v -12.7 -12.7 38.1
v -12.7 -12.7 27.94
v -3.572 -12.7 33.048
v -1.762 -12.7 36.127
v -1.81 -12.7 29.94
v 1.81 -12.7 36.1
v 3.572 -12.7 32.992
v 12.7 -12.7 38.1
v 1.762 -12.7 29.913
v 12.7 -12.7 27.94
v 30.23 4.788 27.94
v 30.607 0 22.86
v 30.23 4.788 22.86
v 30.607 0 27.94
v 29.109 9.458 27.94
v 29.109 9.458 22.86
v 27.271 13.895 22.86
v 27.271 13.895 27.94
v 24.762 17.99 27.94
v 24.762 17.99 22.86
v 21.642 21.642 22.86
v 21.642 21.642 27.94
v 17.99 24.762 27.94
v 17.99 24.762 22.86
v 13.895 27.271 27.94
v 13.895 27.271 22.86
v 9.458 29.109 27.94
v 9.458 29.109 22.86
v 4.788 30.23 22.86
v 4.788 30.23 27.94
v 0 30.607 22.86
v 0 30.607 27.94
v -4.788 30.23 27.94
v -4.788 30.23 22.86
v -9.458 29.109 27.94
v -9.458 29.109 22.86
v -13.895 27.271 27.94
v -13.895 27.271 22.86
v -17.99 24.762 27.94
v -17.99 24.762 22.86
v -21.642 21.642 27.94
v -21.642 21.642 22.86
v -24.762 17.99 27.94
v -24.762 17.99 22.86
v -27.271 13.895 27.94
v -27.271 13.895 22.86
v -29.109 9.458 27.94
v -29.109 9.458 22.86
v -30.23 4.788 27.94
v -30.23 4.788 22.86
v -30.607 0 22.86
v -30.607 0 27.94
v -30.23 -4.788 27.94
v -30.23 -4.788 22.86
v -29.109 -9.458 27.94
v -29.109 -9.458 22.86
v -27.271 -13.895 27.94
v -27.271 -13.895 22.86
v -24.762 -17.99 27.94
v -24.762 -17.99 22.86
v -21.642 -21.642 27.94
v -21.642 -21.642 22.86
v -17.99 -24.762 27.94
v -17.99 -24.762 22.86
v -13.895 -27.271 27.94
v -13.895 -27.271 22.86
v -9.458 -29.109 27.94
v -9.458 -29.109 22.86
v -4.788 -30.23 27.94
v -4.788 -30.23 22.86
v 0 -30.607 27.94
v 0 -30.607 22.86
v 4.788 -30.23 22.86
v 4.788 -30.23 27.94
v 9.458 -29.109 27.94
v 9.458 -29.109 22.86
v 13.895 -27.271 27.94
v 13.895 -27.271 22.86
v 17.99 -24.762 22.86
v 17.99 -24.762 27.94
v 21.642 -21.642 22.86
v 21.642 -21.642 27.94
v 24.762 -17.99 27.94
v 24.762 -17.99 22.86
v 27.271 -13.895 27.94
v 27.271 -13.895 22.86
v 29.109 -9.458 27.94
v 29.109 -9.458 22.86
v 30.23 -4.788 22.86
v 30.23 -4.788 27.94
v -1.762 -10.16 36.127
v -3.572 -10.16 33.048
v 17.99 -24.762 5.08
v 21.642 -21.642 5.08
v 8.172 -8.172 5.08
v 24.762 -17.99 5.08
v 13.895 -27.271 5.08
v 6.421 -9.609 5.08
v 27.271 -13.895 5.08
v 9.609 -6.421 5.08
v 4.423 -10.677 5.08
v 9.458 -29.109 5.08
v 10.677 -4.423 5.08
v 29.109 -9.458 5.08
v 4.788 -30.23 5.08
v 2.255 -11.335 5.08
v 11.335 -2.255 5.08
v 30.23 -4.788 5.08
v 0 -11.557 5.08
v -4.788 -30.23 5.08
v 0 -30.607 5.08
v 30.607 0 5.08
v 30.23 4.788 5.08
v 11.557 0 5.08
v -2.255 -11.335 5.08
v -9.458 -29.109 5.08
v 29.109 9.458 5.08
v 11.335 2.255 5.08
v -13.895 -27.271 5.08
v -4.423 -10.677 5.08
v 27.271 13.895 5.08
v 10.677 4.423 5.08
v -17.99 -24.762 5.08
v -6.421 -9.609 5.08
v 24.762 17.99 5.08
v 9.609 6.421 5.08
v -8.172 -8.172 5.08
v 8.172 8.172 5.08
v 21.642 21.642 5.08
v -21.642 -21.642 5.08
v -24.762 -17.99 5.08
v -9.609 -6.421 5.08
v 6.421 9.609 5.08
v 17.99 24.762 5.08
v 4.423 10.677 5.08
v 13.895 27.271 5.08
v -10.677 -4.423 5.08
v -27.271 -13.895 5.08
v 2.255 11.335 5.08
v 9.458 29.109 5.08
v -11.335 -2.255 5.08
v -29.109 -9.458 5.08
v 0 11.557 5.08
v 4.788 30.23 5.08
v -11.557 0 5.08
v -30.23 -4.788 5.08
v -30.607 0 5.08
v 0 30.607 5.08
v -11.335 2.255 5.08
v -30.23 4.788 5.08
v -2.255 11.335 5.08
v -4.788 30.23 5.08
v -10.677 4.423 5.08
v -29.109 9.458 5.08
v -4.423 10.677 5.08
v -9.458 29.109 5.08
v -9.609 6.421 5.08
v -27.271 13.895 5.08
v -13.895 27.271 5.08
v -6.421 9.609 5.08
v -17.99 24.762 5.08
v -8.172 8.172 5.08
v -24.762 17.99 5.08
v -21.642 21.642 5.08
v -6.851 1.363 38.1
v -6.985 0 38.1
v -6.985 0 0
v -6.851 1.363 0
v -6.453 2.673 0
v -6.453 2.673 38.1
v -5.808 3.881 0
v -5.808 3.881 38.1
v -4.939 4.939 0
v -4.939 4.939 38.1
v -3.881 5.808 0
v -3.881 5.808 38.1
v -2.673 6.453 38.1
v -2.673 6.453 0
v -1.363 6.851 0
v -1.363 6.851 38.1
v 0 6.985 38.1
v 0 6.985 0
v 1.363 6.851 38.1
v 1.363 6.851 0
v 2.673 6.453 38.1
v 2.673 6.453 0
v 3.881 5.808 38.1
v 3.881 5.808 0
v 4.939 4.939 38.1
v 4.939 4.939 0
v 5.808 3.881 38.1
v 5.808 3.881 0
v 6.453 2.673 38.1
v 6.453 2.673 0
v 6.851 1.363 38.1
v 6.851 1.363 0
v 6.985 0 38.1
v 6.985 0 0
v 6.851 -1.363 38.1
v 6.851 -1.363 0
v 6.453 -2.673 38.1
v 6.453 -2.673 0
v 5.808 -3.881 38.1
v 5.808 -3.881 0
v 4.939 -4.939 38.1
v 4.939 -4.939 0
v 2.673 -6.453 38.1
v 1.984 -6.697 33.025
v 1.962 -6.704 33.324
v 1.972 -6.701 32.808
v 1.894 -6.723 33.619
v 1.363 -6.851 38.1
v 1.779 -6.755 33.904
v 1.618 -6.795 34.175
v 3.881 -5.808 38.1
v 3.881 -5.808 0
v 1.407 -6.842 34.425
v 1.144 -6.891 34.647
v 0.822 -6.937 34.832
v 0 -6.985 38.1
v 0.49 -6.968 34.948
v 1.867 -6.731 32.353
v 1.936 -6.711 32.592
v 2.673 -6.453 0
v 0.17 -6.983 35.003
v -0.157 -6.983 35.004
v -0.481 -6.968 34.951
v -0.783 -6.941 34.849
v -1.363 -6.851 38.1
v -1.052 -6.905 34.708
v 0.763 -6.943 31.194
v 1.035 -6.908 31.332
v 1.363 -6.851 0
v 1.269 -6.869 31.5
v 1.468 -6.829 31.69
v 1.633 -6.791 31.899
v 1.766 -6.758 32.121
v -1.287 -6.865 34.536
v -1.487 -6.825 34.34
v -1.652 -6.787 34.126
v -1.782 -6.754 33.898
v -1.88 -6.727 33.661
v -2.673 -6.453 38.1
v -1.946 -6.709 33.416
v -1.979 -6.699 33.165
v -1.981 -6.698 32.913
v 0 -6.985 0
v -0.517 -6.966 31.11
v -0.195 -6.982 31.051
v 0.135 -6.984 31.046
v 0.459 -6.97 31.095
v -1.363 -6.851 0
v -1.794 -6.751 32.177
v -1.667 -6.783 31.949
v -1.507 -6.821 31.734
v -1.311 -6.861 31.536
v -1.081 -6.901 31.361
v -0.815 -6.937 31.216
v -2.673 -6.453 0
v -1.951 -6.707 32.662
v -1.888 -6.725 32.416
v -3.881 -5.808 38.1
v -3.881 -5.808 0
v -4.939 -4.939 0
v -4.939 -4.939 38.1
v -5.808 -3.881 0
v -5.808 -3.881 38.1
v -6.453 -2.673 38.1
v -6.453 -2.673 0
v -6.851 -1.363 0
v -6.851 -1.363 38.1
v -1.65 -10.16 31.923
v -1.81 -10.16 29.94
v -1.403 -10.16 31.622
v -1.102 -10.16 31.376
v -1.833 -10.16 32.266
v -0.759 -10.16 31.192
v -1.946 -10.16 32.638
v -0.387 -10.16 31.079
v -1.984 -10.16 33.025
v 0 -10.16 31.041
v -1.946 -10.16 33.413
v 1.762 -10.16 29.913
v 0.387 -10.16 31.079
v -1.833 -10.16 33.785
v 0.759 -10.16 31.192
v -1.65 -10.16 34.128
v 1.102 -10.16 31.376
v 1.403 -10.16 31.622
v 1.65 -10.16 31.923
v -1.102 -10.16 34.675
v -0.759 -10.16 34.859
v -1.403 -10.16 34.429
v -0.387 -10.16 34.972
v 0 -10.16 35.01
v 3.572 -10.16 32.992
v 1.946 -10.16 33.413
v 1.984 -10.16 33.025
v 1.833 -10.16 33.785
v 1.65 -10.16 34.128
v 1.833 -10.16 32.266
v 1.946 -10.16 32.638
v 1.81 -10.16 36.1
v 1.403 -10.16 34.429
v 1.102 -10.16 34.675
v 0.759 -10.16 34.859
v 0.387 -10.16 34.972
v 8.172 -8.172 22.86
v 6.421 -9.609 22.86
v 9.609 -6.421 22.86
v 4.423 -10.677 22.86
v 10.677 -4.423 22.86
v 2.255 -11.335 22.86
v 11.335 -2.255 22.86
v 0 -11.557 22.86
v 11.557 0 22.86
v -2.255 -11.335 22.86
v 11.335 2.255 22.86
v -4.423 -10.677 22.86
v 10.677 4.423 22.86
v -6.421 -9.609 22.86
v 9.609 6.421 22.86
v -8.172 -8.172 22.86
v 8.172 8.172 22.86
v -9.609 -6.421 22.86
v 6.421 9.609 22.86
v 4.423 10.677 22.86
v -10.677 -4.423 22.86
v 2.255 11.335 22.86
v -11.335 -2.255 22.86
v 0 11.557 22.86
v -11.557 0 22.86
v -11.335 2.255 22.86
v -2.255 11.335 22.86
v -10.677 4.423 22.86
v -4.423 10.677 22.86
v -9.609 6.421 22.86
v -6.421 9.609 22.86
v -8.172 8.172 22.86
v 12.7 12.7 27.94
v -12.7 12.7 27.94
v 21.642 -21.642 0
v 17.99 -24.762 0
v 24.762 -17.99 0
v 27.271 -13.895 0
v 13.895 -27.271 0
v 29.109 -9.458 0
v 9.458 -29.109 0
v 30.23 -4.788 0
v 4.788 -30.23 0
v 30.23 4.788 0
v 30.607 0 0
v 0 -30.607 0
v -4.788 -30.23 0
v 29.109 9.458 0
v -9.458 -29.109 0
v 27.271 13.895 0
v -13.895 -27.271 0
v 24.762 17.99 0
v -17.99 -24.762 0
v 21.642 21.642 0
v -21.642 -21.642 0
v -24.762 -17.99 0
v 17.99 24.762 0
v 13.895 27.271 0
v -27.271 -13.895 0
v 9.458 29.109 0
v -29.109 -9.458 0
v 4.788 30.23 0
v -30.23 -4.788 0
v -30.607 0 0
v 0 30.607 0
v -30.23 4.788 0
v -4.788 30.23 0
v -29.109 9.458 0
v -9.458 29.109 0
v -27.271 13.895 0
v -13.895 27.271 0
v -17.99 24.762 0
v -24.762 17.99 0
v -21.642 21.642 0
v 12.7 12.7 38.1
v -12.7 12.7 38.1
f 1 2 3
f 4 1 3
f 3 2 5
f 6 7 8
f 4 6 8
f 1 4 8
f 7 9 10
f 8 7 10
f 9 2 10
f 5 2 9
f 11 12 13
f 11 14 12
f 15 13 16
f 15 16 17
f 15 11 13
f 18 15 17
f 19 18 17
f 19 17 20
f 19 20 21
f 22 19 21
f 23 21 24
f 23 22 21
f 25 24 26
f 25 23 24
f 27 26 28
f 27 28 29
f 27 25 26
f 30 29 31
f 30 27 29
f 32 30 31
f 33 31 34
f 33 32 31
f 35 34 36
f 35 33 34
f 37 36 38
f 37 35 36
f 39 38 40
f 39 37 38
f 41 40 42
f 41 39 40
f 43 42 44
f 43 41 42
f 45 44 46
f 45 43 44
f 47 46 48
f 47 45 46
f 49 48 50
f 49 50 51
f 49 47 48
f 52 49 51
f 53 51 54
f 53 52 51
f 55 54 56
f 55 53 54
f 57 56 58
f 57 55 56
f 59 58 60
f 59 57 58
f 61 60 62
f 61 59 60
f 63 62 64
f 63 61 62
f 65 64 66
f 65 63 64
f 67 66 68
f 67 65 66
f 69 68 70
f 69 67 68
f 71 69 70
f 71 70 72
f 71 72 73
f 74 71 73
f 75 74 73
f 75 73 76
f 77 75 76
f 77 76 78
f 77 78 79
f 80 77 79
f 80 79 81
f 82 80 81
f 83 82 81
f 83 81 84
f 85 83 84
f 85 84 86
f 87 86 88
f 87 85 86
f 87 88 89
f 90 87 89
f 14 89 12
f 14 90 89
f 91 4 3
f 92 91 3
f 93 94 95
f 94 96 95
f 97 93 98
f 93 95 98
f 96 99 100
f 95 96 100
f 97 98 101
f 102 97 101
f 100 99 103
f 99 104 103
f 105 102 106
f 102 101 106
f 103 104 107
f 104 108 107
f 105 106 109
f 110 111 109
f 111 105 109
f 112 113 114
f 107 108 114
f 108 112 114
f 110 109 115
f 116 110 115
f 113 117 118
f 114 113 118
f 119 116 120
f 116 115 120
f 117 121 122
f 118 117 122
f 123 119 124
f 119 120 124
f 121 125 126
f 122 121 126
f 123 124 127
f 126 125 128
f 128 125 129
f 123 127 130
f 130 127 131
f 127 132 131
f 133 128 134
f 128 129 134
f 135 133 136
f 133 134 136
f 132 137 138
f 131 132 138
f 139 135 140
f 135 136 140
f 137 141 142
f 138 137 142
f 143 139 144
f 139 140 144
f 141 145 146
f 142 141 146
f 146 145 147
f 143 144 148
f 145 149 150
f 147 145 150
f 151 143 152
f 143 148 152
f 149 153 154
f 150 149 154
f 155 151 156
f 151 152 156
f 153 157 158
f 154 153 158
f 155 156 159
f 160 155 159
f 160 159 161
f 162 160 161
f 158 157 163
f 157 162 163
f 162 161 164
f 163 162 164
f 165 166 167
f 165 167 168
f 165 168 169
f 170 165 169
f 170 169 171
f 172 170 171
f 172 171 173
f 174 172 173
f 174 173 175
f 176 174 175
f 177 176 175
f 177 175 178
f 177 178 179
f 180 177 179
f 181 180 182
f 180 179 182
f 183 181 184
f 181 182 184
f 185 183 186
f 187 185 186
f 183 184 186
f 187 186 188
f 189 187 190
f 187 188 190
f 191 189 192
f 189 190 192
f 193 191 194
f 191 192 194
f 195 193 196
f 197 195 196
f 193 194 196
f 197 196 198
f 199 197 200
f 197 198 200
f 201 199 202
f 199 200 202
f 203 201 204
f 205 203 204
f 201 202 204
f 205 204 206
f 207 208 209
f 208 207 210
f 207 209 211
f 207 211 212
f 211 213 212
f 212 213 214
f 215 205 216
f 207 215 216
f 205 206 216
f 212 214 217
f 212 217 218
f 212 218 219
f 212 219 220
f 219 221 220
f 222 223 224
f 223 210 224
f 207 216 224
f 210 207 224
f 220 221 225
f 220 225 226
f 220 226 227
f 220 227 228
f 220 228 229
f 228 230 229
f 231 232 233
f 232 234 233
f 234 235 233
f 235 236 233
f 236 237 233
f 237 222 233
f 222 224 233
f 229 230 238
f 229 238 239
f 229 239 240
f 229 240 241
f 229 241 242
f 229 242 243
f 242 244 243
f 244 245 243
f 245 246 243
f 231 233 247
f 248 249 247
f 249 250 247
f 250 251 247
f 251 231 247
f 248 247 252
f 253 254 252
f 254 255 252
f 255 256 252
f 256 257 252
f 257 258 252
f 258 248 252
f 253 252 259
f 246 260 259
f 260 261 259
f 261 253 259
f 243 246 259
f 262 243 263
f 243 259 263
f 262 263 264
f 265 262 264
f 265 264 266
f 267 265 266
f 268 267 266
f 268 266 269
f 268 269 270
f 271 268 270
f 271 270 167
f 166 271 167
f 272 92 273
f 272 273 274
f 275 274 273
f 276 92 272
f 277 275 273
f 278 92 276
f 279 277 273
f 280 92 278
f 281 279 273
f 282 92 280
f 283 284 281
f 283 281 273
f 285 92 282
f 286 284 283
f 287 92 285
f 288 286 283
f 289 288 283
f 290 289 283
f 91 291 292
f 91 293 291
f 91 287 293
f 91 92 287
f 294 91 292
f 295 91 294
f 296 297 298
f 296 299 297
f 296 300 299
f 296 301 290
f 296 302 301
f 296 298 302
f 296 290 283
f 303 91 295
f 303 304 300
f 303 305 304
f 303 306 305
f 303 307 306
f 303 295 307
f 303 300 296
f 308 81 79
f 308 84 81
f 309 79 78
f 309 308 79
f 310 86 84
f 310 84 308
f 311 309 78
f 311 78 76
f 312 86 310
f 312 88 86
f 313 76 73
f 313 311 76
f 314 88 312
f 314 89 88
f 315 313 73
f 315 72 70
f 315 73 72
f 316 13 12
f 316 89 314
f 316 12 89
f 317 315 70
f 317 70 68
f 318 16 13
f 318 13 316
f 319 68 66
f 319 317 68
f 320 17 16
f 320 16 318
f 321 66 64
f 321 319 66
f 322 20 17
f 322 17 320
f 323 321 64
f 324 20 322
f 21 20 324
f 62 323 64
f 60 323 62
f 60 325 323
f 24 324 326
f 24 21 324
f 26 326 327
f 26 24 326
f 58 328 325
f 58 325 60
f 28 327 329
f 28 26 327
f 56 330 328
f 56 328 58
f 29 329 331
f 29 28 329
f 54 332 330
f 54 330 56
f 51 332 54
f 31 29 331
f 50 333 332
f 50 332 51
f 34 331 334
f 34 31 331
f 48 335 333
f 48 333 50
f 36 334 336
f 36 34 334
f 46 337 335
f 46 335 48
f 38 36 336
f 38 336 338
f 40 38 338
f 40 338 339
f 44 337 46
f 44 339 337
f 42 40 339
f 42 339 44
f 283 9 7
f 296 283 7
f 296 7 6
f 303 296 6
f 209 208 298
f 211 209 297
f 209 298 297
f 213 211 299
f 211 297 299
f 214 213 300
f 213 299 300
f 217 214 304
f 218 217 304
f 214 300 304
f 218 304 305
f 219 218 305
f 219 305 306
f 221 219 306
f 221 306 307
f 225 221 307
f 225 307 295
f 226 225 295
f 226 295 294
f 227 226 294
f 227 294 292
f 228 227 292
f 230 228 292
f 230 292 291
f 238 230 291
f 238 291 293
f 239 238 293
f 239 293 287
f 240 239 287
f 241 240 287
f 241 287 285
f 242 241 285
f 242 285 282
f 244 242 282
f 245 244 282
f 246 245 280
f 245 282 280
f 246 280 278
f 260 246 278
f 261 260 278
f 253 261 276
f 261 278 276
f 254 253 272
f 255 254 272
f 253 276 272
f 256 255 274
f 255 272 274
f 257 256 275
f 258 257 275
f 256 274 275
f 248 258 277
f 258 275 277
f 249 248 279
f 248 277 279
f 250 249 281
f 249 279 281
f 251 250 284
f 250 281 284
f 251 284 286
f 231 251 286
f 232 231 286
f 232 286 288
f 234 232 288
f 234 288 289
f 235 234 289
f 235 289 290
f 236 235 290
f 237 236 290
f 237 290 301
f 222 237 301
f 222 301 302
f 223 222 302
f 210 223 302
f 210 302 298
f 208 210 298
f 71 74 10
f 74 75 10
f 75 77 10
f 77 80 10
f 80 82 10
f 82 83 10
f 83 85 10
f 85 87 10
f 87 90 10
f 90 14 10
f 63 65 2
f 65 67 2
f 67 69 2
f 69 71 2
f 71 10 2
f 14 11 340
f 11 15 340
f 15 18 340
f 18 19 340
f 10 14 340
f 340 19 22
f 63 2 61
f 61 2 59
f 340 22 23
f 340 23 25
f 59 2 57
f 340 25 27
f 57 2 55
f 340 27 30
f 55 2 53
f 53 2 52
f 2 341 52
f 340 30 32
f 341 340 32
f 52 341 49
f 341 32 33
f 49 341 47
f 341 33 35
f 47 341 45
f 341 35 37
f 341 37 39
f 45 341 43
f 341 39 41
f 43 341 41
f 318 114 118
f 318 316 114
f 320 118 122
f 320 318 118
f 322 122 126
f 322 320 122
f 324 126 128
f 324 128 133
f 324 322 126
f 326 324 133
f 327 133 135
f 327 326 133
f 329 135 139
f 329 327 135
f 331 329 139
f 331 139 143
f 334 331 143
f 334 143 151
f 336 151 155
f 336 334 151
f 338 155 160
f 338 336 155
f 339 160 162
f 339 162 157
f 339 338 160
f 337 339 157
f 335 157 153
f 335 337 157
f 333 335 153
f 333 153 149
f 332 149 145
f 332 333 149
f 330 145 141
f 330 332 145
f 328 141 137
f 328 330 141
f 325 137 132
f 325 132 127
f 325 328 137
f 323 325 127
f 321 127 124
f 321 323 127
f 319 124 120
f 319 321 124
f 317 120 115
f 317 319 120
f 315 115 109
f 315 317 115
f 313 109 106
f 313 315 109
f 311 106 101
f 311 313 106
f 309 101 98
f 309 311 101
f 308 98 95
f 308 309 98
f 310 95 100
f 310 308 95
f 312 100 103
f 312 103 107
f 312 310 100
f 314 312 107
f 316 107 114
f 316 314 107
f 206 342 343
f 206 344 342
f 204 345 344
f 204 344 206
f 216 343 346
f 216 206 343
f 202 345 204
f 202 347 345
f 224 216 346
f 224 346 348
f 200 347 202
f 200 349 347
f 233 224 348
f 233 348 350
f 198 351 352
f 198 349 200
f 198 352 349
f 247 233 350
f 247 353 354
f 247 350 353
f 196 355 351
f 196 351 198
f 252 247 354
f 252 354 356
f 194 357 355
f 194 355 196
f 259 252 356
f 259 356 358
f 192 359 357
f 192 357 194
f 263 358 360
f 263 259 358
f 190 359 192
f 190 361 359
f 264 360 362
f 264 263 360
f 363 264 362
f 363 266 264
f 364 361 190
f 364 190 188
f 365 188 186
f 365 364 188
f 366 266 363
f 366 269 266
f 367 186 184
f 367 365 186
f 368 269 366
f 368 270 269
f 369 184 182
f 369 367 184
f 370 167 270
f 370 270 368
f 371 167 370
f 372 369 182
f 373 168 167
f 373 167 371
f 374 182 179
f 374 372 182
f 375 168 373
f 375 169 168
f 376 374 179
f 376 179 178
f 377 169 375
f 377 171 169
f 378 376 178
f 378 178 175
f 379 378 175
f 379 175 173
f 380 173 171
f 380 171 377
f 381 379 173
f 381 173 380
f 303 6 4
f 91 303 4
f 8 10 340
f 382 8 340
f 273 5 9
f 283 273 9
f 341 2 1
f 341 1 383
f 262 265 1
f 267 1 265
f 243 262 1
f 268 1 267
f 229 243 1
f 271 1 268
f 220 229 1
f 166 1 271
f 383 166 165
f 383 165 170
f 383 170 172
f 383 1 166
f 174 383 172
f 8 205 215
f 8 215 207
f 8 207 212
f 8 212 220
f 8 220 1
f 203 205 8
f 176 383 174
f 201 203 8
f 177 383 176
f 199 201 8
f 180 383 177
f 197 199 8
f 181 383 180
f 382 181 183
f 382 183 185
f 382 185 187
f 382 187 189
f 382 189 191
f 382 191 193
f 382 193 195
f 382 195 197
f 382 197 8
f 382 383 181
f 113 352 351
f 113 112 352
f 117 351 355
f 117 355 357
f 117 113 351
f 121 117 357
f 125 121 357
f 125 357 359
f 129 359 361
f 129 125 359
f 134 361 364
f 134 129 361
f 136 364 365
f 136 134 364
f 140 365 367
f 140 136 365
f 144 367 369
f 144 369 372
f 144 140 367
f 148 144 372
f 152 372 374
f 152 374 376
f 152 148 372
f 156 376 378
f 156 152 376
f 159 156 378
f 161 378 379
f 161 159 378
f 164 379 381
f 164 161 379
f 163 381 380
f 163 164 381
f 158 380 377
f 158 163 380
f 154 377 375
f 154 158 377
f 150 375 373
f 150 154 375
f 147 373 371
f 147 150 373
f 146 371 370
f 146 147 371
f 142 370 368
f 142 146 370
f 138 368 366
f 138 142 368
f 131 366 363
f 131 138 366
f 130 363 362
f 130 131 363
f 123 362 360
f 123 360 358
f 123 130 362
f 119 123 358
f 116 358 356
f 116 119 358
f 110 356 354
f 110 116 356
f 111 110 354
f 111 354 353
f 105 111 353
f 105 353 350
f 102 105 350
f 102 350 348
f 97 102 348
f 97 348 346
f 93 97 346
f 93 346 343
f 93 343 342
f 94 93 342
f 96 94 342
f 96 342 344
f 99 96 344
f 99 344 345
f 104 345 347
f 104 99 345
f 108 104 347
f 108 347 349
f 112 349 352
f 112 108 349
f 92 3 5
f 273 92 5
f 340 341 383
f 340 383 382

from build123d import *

# Parameters (mm, degrees)
F0_W      = 6.477
F0_H      = 38.1
F0_W_2    = 19.05
F0_H_2    = 5.08
F4_D      = 13.97
F5_W      = 25.4
F5_H      = 25.4
F5_R      = 11.557
F6_DEPTH  = 10.16
F8_DEPTH  = 2.54
F9_R      = 1.984375
F10_DEPTH = 5.08


with BuildPart() as f1:
    # F0 (on Front) → F1 (revolve)
    with BuildSketch(Plane.XZ):
        with Locations((3.2385, 19.05)):
            Rectangle(F0_W, F0_H)
        Polygon((6.477, 38.1), (6.477, 0), (11.557, 0), (11.557, 5.08), (11.557, 22.86), (11.557, 27.94), (11.557, 38.1), align=None)
        with Locations((21.082, 2.54)):
            Rectangle(F0_W_2, F0_H_2)
        with Locations((21.082, 25.4)):
            Rectangle(F0_W_2, F0_H_2)
    revolve(axis=Axis((0, 0, 19.05), (0, 0, 1)))

    # F4 (through all)
    with Locations(Plane.XY.offset(38.1)):
        with Locations((0, 0)):
            Hole(F4_D / 2)

    # F5 (on face) → F6 (join)
    with BuildSketch(Plane.XY.offset(27.94)):
        Rectangle(F5_W, F5_H)
        Circle(F5_R, mode=Mode.SUBTRACT)
    extrude(amount=F6_DEPTH)

    # F7 (on face) → F8 (cut)
    with BuildSketch(Plane.XZ.offset(12.7)):
        Polygon((-1.809819, 29.940453), (1.762056, 29.912878), (3.571875, 32.992424), (1.809819, 36.099547), (-1.762056, 36.127122), (-3.571875, 33.047576), align=None)
    extrude(amount=-F8_DEPTH, mode=Mode.SUBTRACT)

    # F9 (on face) → F10 (cut)
    with BuildSketch(Plane.XZ.offset(10.16)):
        with Locations((0, 33.025466)):
            Circle(F9_R)
    extrude(amount=-F10_DEPTH, mode=Mode.SUBTRACT)


solid = f1.part
